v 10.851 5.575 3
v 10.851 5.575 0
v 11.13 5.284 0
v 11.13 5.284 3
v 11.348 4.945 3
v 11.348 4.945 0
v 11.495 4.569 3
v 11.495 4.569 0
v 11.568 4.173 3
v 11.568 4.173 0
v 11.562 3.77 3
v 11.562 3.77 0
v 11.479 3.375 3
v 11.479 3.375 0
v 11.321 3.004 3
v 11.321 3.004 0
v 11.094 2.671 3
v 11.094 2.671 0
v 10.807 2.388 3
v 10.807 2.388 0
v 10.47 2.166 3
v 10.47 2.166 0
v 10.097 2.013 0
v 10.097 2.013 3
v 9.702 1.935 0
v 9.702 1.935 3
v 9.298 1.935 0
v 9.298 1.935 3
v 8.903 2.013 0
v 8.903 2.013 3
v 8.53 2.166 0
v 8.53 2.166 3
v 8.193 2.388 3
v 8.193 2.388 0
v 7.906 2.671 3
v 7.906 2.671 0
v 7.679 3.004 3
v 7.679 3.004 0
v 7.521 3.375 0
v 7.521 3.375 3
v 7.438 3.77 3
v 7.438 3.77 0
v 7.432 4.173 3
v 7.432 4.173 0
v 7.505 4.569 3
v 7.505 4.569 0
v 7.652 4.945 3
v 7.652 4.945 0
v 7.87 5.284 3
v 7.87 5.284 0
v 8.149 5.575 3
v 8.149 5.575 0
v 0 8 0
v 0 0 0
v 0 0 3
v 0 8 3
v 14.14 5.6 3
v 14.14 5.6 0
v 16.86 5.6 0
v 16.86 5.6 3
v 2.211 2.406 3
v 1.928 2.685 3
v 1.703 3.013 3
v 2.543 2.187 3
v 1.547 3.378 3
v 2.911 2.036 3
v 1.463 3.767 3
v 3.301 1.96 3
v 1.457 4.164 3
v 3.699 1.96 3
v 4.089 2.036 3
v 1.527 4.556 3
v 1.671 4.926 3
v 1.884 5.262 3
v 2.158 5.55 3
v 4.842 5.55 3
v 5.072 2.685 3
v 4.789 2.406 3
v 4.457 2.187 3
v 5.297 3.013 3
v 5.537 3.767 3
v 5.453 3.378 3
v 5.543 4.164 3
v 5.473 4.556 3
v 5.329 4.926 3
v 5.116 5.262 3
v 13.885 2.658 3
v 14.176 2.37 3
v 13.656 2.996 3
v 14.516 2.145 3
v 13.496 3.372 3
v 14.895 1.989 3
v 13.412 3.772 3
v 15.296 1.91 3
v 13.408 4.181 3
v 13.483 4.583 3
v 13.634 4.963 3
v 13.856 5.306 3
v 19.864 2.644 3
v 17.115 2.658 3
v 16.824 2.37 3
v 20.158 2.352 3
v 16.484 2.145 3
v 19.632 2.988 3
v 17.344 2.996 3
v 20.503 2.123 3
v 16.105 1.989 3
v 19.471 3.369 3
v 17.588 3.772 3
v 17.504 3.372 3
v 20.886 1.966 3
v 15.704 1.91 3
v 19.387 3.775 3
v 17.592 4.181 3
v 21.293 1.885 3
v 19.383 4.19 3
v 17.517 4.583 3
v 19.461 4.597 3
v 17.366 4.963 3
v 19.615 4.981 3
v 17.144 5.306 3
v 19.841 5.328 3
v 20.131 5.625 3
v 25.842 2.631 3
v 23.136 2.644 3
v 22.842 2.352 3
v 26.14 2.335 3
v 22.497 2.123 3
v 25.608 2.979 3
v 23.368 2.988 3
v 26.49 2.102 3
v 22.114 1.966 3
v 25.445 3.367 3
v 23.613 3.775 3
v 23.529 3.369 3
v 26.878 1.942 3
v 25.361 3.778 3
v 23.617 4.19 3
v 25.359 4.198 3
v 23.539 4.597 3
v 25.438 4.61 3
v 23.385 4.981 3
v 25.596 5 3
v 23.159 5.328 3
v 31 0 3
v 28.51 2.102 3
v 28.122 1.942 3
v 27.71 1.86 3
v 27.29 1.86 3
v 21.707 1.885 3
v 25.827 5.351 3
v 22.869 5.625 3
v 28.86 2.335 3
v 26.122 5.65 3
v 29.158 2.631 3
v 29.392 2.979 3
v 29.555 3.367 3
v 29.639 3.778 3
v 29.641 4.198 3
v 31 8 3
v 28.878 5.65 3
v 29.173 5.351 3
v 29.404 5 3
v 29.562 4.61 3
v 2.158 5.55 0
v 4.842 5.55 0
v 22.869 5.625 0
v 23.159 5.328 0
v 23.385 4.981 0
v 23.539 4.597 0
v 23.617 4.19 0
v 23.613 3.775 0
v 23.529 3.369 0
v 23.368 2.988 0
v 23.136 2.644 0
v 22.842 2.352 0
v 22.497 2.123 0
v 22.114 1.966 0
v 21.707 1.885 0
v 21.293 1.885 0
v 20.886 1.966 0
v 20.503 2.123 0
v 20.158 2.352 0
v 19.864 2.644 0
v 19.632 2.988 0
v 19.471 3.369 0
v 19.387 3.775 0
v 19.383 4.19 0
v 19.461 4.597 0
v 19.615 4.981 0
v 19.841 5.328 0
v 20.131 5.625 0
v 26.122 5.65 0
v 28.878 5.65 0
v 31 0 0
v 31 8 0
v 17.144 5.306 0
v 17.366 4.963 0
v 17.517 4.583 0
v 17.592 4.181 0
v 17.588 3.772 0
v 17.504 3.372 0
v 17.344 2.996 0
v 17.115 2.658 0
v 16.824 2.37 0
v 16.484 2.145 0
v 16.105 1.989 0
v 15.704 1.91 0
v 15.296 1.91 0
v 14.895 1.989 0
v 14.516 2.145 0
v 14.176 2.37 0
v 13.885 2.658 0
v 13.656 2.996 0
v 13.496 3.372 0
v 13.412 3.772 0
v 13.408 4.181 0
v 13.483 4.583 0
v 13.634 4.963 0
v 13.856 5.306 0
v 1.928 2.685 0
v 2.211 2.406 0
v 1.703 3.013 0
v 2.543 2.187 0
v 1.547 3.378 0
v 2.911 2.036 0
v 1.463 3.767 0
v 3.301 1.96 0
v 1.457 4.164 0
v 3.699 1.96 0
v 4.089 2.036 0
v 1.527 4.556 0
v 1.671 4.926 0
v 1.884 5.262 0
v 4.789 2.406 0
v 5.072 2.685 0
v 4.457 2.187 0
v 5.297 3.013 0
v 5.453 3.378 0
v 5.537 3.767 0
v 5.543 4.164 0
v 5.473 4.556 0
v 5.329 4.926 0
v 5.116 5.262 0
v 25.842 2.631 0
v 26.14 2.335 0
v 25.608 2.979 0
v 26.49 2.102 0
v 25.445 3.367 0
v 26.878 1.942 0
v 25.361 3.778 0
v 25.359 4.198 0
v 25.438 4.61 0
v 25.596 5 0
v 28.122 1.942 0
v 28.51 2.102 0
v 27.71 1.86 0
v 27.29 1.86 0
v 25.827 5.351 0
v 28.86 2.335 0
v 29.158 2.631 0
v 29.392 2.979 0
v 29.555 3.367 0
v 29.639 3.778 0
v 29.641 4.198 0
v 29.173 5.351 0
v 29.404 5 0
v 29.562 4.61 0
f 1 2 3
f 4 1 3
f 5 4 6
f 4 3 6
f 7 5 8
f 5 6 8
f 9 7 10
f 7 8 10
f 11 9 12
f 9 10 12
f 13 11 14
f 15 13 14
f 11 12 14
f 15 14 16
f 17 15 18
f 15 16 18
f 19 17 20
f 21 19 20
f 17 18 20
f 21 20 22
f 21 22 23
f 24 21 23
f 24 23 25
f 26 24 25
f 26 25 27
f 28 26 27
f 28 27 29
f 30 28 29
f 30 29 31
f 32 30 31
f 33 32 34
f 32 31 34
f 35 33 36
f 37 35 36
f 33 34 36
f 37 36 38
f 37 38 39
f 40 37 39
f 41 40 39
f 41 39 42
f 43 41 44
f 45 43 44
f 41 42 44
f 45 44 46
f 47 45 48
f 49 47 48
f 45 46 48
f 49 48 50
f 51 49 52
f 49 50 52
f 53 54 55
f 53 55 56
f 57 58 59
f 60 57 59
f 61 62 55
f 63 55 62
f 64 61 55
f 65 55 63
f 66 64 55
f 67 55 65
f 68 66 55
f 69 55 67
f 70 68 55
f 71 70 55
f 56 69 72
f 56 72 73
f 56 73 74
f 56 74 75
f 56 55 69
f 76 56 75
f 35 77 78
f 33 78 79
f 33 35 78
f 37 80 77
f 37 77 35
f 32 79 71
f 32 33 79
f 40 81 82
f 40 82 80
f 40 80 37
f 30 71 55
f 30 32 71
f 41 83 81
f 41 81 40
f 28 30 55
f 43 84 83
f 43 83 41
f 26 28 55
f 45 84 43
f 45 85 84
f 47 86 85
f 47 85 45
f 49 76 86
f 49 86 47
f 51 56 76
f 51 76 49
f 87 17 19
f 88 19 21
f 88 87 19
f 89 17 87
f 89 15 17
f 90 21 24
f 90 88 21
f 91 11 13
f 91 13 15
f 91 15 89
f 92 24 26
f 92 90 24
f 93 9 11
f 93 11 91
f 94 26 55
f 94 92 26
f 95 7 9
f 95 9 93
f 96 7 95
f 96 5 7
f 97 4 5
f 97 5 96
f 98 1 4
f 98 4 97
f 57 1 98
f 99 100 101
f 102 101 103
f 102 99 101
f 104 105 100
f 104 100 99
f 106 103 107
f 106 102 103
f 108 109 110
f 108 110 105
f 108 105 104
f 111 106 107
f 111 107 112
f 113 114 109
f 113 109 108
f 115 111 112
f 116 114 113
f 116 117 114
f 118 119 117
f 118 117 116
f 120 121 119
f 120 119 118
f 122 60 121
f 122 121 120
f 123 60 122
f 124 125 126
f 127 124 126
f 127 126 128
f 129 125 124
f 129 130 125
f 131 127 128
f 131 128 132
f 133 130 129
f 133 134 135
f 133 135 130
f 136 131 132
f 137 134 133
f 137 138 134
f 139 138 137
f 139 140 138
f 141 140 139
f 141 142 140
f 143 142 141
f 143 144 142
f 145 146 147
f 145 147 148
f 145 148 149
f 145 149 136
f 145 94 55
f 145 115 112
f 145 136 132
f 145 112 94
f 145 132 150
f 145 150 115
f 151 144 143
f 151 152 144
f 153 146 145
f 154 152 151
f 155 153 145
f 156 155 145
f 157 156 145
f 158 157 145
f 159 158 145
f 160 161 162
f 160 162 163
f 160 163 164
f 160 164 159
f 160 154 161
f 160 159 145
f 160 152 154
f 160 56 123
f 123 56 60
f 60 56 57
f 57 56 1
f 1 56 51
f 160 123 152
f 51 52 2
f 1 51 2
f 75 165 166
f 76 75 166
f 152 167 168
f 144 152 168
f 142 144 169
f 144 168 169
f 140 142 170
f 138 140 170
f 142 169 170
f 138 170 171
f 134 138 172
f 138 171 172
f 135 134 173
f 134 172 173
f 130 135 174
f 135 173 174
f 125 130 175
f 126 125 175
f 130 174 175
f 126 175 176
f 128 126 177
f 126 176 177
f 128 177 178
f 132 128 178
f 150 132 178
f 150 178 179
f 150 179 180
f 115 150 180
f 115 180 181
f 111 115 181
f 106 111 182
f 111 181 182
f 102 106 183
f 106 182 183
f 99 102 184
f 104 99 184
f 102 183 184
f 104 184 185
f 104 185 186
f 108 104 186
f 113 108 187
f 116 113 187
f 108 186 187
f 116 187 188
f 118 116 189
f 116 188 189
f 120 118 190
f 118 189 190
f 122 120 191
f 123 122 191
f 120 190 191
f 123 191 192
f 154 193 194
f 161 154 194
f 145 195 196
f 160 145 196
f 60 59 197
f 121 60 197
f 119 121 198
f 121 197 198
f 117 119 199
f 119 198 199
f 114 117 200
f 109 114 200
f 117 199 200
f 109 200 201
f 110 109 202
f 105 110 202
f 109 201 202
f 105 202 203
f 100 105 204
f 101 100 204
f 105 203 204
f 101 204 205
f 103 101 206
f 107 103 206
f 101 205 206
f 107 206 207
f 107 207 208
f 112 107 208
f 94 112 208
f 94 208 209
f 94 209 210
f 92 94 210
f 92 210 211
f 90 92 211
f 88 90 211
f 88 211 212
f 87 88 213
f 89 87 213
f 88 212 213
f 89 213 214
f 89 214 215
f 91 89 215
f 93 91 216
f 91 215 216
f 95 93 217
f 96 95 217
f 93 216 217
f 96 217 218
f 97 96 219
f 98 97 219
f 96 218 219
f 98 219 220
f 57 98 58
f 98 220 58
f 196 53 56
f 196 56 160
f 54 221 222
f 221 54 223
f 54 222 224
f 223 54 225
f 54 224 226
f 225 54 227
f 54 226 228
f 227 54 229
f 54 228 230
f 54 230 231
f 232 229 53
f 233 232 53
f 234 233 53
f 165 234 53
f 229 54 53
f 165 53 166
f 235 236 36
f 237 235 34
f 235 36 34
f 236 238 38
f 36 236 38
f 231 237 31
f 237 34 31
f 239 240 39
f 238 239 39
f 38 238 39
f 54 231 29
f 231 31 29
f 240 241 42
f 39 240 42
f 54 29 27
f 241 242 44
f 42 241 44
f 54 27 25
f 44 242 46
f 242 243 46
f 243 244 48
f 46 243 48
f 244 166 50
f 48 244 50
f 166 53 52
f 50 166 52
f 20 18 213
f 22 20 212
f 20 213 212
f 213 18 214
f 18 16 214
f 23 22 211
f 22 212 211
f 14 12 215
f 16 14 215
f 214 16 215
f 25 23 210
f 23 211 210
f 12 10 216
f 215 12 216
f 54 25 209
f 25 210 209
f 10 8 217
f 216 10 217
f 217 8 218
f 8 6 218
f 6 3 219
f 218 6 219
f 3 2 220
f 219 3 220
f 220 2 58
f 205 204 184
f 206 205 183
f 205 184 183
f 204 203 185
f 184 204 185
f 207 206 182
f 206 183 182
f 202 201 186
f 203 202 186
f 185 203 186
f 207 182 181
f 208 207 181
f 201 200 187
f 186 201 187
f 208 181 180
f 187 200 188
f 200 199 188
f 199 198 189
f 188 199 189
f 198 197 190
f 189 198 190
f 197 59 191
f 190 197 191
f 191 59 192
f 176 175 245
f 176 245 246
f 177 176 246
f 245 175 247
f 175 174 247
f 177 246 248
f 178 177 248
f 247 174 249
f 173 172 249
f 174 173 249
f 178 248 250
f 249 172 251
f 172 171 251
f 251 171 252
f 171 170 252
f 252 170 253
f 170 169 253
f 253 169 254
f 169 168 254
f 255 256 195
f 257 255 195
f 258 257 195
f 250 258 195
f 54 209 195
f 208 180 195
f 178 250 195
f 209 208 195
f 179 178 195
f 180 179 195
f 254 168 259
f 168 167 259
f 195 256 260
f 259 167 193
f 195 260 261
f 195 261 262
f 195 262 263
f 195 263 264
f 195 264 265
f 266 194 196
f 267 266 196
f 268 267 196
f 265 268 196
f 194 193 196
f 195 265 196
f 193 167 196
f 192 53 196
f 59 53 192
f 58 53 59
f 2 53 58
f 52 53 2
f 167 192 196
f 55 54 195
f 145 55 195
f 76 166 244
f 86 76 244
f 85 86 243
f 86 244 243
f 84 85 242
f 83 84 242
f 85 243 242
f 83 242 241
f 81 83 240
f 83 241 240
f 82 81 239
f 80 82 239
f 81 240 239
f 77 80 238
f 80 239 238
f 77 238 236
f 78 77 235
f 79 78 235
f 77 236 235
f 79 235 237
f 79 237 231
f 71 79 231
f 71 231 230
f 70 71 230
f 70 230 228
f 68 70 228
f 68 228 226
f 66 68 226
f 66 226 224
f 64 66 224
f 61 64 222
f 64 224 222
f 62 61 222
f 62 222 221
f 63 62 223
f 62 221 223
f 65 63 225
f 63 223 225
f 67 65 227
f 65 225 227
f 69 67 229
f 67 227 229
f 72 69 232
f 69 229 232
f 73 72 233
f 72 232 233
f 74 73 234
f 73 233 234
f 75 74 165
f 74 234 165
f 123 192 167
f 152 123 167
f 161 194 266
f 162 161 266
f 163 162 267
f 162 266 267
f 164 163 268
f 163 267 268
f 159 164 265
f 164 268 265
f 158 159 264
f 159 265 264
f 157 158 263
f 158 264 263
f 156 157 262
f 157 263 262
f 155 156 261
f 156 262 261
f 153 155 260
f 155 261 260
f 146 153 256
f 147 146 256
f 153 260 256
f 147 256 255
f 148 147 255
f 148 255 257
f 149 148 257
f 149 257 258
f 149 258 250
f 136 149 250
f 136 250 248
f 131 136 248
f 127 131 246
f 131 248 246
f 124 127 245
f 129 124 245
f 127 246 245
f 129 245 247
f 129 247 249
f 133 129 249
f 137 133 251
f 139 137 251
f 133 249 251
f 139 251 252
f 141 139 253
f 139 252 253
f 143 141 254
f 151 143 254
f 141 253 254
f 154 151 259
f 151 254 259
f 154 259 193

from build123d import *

# Parameters (mm, degrees)
SKETCH1_W           = 31
SKETCH1_H           = 8
BOSS_EXTRUDE1_DEPTH = 3


with BuildPart() as part:
    # Sketch1 → Boss-Extrude1 (new body)
    with BuildSketch(Plane.XY):
        with Locations((15.5, 4)):
            Rectangle(SKETCH1_W, SKETCH1_H)
        with BuildLine():
            Line((2.158359214, 5.55), (4.841640786, 5.55))
            ThreePointArc((4.841640786, 5.55), (3.5, 1.95), (2.158359214, 5.55))
        make_face(mode=Mode.SUBTRACT)
        with BuildLine():
            Line((8.149074391, 5.575), (10.850925609, 5.575))
            ThreePointArc((10.850925609, 5.575), (9.5, 1.925), (8.149074391, 5.575))
        make_face(mode=Mode.SUBTRACT)
        with BuildLine():
            Line((14.139852949, 5.6), (16.860147051, 5.6))
            ThreePointArc((16.860147051, 5.6), (15.5, 1.9), (14.139852949, 5.6))
        make_face(mode=Mode.SUBTRACT)
        with BuildLine():
            Line((20.130693606, 5.625), (22.869306394, 5.625))
            ThreePointArc((22.869306394, 5.625), (21.5, 1.875), (20.130693606, 5.625))
        make_face(mode=Mode.SUBTRACT)
        with BuildLine():
            Line((26.121595125, 5.65), (28.878404875, 5.65))
            ThreePointArc((28.878404875, 5.65), (27.5, 1.85), (26.121595125, 5.65))
        make_face(mode=Mode.SUBTRACT)
    extrude(amount=BOSS_EXTRUDE1_DEPTH)


solid = part.part
